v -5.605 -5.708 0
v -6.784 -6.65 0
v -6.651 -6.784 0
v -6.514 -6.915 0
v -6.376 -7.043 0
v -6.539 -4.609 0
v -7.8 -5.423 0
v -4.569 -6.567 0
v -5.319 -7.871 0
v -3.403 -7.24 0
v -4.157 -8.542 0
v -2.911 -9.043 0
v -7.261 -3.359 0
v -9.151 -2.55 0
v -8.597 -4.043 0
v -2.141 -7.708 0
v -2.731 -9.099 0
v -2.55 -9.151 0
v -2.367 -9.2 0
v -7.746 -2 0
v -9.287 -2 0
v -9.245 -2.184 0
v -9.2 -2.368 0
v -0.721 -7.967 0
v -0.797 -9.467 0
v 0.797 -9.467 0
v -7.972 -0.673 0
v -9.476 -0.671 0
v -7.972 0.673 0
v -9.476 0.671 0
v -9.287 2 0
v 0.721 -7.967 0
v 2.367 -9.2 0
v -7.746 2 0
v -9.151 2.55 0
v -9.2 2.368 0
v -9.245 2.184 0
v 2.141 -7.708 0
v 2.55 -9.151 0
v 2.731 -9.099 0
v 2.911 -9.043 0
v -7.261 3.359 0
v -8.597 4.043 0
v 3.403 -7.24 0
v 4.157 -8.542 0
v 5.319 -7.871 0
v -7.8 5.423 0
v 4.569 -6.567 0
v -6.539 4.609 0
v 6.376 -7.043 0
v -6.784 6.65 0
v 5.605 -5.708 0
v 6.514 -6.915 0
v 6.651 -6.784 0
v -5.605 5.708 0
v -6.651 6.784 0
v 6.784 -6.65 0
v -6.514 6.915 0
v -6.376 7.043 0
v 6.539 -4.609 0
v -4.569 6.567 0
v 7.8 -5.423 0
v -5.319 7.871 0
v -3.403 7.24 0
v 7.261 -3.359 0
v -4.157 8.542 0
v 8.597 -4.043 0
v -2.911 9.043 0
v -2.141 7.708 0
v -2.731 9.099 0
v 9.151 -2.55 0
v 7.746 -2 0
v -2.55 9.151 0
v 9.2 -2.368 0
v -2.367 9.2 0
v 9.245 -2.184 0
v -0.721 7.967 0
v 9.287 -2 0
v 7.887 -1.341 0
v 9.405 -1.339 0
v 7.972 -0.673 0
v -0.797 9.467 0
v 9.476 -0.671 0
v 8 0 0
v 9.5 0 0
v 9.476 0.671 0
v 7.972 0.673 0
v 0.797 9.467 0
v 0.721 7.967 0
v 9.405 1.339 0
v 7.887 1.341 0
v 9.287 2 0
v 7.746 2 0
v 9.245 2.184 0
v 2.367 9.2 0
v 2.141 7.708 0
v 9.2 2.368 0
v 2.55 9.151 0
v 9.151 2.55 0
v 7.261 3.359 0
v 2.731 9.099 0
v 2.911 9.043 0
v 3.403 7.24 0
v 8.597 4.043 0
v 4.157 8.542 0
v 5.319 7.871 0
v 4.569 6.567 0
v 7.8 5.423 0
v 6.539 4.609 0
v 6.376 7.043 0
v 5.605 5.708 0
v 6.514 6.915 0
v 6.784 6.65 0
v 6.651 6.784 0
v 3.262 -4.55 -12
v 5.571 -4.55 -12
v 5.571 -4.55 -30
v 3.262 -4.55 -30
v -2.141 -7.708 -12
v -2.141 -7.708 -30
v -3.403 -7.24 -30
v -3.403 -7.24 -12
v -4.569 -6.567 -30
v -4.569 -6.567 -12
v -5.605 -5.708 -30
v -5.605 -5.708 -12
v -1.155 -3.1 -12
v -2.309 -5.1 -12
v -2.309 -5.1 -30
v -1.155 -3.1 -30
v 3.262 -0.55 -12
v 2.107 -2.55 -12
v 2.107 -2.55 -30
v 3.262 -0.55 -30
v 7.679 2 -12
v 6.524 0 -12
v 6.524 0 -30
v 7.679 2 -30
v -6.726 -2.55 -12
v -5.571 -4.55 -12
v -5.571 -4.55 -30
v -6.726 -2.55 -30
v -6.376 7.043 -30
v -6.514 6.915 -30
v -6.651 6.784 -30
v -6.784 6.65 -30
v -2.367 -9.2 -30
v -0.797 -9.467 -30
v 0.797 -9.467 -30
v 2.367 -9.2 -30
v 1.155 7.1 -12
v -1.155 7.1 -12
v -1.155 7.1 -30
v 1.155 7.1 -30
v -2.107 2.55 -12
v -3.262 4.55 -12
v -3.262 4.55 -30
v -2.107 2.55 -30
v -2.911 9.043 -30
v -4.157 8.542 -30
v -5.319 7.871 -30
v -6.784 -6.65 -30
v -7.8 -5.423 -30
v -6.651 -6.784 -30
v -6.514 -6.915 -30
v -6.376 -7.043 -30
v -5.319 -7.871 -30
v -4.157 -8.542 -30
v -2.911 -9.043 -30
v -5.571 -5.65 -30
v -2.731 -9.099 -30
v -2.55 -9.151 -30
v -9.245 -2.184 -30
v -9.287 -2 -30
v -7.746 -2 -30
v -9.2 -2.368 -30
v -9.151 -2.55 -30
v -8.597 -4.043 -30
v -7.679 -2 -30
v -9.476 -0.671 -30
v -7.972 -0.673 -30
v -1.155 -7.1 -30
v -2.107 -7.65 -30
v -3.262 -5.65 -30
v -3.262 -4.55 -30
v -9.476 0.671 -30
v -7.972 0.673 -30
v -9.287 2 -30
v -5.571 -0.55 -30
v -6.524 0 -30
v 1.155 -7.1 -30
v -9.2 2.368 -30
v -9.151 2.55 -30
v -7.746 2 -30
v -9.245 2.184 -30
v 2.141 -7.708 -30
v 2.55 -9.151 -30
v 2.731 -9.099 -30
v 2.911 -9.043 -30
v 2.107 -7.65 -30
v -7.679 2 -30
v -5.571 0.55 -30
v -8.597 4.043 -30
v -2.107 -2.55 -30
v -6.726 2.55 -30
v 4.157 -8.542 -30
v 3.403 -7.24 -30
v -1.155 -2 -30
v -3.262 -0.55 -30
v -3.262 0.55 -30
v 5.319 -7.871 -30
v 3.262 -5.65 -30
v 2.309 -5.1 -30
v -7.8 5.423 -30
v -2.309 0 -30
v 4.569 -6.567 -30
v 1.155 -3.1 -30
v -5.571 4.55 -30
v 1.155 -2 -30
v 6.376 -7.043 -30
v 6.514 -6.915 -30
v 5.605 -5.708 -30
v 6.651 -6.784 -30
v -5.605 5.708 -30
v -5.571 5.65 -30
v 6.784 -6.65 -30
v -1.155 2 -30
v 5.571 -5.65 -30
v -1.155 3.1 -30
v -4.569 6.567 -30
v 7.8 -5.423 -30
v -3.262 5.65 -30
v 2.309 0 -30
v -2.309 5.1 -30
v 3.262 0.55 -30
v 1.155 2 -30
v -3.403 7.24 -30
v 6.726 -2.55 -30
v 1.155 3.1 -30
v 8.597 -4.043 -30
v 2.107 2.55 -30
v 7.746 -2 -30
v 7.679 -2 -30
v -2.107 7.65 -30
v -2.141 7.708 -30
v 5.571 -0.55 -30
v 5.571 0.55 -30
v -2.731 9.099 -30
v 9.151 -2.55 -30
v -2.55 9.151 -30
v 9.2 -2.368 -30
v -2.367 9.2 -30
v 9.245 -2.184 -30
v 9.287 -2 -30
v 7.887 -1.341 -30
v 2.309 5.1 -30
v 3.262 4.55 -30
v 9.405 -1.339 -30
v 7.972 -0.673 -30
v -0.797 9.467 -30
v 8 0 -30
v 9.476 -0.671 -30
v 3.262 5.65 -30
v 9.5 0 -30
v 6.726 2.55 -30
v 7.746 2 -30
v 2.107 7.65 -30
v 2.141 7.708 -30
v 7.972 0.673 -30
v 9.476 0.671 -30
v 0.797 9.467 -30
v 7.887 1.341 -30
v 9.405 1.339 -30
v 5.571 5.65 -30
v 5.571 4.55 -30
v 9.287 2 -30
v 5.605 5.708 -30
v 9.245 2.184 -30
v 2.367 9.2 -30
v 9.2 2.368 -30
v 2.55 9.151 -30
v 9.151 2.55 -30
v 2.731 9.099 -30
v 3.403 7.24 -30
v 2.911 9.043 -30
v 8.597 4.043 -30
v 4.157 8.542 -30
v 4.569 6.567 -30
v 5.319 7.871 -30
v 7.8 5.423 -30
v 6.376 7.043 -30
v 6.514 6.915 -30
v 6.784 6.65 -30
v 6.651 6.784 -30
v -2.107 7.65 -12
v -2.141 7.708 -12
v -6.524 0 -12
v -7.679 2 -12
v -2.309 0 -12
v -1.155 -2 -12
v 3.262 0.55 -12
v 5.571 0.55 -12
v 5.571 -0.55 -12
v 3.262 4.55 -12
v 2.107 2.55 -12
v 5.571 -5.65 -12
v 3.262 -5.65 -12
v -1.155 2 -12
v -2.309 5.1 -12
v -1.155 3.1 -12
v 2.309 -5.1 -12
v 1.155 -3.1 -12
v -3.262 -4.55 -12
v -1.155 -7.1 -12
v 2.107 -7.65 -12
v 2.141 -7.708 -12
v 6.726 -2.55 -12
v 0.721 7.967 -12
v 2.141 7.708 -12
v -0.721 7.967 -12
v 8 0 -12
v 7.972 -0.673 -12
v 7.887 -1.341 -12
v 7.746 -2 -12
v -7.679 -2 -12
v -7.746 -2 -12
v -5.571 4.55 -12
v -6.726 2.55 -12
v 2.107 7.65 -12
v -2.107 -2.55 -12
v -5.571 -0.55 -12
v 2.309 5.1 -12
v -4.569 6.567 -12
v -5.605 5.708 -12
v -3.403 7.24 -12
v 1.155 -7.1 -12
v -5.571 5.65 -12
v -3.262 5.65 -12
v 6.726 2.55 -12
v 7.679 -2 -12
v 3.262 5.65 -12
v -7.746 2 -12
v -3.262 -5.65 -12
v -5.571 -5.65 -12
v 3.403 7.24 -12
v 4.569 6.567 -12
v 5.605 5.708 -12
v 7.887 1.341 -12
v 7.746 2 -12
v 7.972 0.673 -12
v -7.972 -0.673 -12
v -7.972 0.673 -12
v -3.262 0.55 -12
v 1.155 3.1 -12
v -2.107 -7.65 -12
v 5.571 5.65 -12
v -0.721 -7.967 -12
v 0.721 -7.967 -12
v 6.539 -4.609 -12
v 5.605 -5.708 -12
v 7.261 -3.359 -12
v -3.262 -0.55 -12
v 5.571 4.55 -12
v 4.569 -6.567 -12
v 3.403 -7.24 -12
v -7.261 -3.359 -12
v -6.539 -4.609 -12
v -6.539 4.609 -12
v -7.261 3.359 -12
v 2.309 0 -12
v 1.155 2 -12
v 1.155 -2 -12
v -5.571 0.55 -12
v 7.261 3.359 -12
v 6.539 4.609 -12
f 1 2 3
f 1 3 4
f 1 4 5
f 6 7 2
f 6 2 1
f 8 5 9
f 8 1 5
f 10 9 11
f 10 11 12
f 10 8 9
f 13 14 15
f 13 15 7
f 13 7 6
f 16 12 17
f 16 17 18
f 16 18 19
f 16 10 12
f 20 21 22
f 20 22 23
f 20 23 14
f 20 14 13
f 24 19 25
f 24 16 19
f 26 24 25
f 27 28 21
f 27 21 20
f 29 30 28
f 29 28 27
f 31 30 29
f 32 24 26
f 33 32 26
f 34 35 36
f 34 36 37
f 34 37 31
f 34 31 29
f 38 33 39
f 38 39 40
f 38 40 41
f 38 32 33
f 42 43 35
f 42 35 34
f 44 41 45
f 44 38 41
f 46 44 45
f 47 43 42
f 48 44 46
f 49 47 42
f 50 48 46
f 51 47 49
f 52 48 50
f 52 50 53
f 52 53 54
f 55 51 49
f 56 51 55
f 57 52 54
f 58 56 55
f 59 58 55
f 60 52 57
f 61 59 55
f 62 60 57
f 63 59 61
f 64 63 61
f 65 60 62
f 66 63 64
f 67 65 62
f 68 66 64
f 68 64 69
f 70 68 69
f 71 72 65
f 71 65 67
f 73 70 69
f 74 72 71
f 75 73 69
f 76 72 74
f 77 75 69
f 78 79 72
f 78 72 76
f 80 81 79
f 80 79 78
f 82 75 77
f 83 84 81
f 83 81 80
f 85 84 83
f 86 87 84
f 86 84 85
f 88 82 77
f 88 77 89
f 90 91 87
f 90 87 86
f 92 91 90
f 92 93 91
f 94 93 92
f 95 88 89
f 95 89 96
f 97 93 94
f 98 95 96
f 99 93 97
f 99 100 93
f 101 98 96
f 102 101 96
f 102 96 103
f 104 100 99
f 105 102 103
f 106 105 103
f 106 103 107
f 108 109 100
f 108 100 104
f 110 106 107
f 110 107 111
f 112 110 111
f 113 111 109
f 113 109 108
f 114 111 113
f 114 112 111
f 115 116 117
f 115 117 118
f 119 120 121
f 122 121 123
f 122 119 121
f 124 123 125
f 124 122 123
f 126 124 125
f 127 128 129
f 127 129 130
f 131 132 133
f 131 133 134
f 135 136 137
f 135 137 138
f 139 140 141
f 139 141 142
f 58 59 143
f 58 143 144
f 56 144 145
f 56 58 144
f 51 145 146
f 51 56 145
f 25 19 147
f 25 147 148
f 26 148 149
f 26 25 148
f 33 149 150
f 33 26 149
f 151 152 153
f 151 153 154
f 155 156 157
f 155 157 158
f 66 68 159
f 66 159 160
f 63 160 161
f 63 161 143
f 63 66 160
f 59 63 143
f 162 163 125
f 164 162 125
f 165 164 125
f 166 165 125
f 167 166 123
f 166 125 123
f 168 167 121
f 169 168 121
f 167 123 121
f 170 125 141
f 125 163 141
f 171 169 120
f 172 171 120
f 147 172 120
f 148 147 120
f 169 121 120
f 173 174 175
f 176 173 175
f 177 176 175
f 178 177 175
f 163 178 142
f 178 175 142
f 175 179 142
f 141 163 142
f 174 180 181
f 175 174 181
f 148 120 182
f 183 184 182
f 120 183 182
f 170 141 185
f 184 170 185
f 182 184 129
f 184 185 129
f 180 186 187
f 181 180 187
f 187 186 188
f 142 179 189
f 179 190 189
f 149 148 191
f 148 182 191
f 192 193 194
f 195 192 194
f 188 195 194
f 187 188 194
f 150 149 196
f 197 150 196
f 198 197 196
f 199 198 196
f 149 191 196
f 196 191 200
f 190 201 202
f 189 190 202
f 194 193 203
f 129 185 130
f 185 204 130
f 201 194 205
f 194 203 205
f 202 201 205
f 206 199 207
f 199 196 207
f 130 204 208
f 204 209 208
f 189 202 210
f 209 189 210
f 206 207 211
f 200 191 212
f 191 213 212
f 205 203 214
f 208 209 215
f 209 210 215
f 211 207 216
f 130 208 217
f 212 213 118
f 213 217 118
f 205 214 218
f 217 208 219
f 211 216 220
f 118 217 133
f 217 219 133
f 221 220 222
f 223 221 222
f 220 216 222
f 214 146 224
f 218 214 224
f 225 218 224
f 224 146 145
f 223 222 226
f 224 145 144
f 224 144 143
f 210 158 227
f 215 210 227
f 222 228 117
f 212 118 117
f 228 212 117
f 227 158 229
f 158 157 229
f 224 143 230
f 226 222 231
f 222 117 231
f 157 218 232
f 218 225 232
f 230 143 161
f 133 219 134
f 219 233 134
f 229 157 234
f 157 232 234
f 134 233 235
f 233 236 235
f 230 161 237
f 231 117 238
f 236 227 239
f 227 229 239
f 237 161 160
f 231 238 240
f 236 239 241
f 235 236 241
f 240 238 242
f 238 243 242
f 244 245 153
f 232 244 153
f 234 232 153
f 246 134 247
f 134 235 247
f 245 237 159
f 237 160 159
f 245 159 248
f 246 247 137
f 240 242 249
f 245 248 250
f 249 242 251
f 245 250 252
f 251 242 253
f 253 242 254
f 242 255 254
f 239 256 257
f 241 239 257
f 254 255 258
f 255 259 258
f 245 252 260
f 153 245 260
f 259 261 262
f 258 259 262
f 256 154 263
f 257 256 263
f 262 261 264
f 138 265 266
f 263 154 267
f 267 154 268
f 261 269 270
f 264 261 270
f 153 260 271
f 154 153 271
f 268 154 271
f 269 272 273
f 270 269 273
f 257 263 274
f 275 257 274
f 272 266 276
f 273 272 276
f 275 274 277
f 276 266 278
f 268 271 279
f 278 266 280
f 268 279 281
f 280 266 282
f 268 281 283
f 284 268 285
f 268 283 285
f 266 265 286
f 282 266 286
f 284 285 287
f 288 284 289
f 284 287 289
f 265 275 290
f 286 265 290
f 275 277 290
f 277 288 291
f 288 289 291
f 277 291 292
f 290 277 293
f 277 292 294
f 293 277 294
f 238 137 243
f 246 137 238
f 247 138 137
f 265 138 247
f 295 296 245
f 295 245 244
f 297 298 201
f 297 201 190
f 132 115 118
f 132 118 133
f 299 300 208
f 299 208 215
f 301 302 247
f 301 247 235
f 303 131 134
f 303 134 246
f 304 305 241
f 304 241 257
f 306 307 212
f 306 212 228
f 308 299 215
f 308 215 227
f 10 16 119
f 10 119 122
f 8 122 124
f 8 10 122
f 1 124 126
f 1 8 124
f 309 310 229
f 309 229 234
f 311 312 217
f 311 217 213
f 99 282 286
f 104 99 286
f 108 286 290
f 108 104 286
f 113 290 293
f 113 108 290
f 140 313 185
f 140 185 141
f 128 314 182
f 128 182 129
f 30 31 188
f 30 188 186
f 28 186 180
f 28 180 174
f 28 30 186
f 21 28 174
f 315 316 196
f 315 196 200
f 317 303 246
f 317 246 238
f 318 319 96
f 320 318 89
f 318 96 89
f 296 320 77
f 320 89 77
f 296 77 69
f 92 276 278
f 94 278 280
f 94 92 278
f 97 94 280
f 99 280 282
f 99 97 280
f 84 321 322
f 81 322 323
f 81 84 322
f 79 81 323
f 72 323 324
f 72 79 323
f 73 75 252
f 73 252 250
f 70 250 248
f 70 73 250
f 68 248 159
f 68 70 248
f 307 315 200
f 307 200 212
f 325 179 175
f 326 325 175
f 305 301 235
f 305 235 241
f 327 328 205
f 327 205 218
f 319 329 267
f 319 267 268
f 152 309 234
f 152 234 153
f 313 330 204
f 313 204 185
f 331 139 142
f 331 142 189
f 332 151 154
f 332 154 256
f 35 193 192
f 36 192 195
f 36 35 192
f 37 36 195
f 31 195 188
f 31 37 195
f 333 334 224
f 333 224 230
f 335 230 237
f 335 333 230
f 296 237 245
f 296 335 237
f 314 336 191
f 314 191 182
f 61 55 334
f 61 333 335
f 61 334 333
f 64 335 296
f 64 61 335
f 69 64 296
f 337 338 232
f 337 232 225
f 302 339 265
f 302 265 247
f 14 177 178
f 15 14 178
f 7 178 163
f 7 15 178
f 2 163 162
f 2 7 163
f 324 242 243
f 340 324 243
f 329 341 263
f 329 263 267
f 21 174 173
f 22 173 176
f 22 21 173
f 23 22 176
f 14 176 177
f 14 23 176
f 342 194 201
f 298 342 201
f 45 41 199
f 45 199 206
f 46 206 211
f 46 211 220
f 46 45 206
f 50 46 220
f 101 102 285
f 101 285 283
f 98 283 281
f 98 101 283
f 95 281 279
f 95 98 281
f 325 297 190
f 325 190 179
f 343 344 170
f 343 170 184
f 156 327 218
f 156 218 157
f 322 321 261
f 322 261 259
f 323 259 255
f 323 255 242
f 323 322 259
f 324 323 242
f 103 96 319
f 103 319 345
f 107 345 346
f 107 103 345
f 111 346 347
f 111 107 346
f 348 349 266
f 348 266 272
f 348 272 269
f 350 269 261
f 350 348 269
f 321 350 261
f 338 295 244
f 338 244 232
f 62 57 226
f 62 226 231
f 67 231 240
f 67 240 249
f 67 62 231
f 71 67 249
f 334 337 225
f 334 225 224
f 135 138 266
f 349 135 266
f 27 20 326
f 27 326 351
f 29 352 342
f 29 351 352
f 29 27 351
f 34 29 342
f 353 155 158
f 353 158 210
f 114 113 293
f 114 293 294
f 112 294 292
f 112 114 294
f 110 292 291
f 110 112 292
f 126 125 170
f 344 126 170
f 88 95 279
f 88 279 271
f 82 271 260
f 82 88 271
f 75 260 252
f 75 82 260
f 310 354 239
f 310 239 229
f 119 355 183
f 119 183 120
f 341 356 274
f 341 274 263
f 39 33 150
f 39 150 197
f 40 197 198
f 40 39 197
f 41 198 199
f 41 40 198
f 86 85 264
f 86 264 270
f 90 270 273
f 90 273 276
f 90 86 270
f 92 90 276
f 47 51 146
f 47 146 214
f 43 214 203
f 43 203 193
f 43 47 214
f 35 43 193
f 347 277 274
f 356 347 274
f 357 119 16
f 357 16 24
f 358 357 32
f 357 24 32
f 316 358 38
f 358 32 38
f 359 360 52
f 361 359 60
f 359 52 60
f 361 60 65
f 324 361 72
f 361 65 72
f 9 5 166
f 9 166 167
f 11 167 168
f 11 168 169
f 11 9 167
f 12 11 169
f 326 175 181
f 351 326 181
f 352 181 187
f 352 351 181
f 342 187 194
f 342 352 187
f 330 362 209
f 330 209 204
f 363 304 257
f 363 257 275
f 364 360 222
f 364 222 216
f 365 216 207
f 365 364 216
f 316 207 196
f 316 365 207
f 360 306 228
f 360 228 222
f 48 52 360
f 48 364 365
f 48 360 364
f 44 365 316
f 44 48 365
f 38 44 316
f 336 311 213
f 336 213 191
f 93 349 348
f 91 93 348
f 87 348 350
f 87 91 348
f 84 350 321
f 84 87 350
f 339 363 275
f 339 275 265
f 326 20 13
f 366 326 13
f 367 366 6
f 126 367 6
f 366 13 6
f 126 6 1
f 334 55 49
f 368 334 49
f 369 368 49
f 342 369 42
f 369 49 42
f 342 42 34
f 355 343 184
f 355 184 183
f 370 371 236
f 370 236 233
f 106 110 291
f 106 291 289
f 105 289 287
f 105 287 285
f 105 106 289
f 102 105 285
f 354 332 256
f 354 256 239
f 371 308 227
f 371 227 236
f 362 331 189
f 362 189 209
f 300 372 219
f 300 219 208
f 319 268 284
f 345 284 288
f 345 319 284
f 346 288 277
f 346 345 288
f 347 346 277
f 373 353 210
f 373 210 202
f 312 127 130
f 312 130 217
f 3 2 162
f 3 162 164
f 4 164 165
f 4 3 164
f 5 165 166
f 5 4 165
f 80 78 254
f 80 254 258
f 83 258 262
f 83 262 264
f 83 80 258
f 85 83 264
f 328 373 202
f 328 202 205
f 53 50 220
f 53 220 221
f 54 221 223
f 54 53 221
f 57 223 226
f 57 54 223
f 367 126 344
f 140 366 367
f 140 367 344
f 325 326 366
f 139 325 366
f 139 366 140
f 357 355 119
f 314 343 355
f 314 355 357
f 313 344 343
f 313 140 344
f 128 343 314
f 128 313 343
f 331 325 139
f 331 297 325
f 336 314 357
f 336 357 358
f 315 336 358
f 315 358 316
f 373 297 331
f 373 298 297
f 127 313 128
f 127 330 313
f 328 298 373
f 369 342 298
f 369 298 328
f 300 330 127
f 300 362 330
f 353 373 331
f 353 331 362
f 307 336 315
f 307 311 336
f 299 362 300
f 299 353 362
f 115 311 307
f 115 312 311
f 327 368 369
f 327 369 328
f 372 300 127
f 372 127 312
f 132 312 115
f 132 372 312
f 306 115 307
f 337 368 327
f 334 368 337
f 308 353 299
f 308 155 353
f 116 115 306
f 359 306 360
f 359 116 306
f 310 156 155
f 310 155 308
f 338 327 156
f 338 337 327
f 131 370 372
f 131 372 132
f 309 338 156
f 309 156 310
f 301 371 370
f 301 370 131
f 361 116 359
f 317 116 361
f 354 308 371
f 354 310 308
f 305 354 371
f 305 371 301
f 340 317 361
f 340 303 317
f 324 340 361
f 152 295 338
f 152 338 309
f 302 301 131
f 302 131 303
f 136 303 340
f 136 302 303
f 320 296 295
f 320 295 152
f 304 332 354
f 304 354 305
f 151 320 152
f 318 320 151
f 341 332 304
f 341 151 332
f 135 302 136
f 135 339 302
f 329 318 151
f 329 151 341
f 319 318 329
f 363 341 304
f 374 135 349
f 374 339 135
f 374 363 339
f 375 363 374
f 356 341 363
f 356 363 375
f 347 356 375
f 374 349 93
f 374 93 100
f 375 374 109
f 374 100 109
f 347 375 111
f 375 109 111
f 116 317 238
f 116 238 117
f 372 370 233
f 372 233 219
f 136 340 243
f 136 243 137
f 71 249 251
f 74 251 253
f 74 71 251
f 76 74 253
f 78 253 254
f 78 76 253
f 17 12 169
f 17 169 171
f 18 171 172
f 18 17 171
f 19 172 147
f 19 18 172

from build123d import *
from build123d import SkipClean  # not in build123d's __all__

# Parameters (mm, degrees)
F1_DEPTH = 30
F2_R     = 8
F3_DEPTH = 12


with BuildPart() as f1:
    # F0 (on Top) → F1 (new body)
    with BuildSketch(Plane.XY):
        with BuildLine():
            Line((-5.9997200782, 5.2918200067), (-6.7840477888, 6.6503154511))
            ThreePointArc((-6.7840477888, 6.6503154511), (-8.227241336, 4.75), (-9.1513660183, 2.55))
            Line((-9.1513660183, 2.55), (-7.5827105971, 2.55))
            ThreePointArc((-7.5827105971, 2.55), (-6.9282032303, 4), (-5.9997200782, 5.2918200067))
        make_face()
        with BuildLine():
            Line((-7.5827105971, 2.55), (-9.1513660183, 2.55))
            ThreePointArc((-9.1513660183, 2.55), (-9.2233274852, 2.2760118851), (-9.2870878105, 2))
            Line((-9.2870878105, 2), (-7.7459666924, 2))
            ThreePointArc((-7.7459666924, 2), (-7.6692706212, 2.2764639549), (-7.5827105971, 2.55))
        make_face()
        with BuildLine():
            Line((-7.7459666924, 2), (-9.2870878105, 2))
            ThreePointArc((-9.2870878105, 2), (-9.5, 0), (-9.2870878105, -2))
            Line((-9.2870878105, -2), (-7.7459666924, -2))
            ThreePointArc((-7.7459666924, -2), (-8, 0), (-7.7459666924, 2))
        make_face()
        with BuildLine():
            ThreePointArc((-9.2870878105, -2), (-9.2233274852, -2.2760118851), (-9.1513660183, -2.55))
            Line((-9.1513660183, -2.55), (-7.5827105971, -2.55))
            ThreePointArc((-7.5827105971, -2.55), (-7.6692706212, -2.2764639549), (-7.7459666924, -2))
            Line((-7.7459666924, -2), (-9.2870878105, -2))
        make_face()
        with BuildLine():
            ThreePointArc((-9.1513660183, -2.55), (-8.227241336, -4.75), (-6.7840477888, -6.6503154511))
            Line((-6.7840477888, -6.6503154511), (-5.9997200782, -5.2918200067))
            ThreePointArc((-5.9997200782, -5.2918200067), (-6.9282032303, -4), (-7.5827105971, -2.55))
            Line((-7.5827105971, -2.55), (-9.1513660183, -2.55))
        make_face()
        with BuildLine():
            ThreePointArc((-6.7840477888, -6.6503154511), (-6.5827478544, -6.849629967), (-6.3755947128, -7.0428539711))
            Line((-6.3755947128, -7.0428539711), (-5.6050341538, -5.7082039325))
            ThreePointArc((-5.6050341538, -5.7082039325), (-5.8061109264, -5.503551209), (-5.9997200782, -5.2918200067))
            Line((-5.9997200782, -5.2918200067), (-6.7840477888, -6.6503154511))
        make_face()
        with BuildLine():
            ThreePointArc((-6.3755947128, -7.0428539711), (-4.75, -8.227241336), (-2.9114930977, -9.0428539711))
            Line((-2.9114930977, -9.0428539711), (-2.1409325386, -7.7082039325))
            ThreePointArc((-2.1409325386, -7.7082039325), (-4, -6.9282032303), (-5.6050341538, -5.7082039325))
            Line((-5.6050341538, -5.7082039325), (-6.3755947128, -7.0428539711))
        make_face()
        with BuildLine():
            ThreePointArc((-2.9114930977, -9.0428539711), (-2.6405796308, -9.1256418521), (-2.3673182295, -9.2003154511))
            Line((-2.3673182295, -9.2003154511), (-1.5829905189, -7.8418200067))
            ThreePointArc((-1.5829905189, -7.8418200067), (-1.8631596948, -7.780015164), (-2.1409325386, -7.7082039325))
            Line((-2.1409325386, -7.7082039325), (-2.9114930977, -9.0428539711))
        make_face()
        with BuildLine():
            ThreePointArc((-2.3673182295, -9.2003154511), (0, -9.5), (2.3673182295, -9.2003154511))
            Line((2.3673182295, -9.2003154511), (1.5829905189, -7.8418200067))
            ThreePointArc((1.5829905189, -7.8418200067), (0, -8), (-1.5829905189, -7.8418200067))
            Line((-1.5829905189, -7.8418200067), (-2.3673182295, -9.2003154511))
        make_face()
        with BuildLine():
            ThreePointArc((2.3673182295, -9.2003154511), (2.6405796308, -9.1256418521), (2.9114930977, -9.0428539711))
            Line((2.9114930977, -9.0428539711), (2.1409325386, -7.7082039325))
            ThreePointArc((2.1409325386, -7.7082039325), (1.8631596948, -7.780015164), (1.5829905189, -7.8418200067))
            Line((1.5829905189, -7.8418200067), (2.3673182295, -9.2003154511))
        make_face()
        with BuildLine():
            ThreePointArc((2.9114930977, -9.0428539711), (4.75, -8.227241336), (6.3755947128, -7.0428539711))
            Line((6.3755947128, -7.0428539711), (5.6050341538, -5.7082039325))
            ThreePointArc((5.6050341538, -5.7082039325), (4, -6.9282032303), (2.1409325386, -7.7082039325))
            Line((2.1409325386, -7.7082039325), (2.9114930977, -9.0428539711))
        make_face()
        with BuildLine():
            ThreePointArc((6.3755947128, -7.0428539711), (6.5827478544, -6.849629967), (6.7840477888, -6.6503154511))
            Line((6.7840477888, -6.6503154511), (5.9997200782, -5.2918200067))
            ThreePointArc((5.9997200782, -5.2918200067), (5.8061109264, -5.503551209), (5.6050341538, -5.7082039325))
            Line((5.6050341538, -5.7082039325), (6.3755947128, -7.0428539711))
        make_face()
        with BuildLine():
            ThreePointArc((6.7840477888, -6.6503154511), (8.227241336, -4.75), (9.1513660183, -2.55))
            Line((9.1513660183, -2.55), (7.5827105971, -2.55))
            ThreePointArc((7.5827105971, -2.55), (6.9282032303, -4), (5.9997200782, -5.2918200067))
            Line((5.9997200782, -5.2918200067), (6.7840477888, -6.6503154511))
        make_face()
        with BuildLine():
            ThreePointArc((9.1513660183, -2.55), (9.2233274852, -2.2760118851), (9.2870878105, -2))
            Line((9.2870878105, -2), (7.7459666924, -2))
            ThreePointArc((7.7459666924, -2), (7.6692706212, -2.2764639549), (7.5827105971, -2.55))
            Line((7.5827105971, -2.55), (9.1513660183, -2.55))
        make_face()
        with BuildLine():
            ThreePointArc((9.2870878105, -2), (9.4466219941, -1.0056504861), (9.5, 0))
            ThreePointArc((9.5, 0), (9.4466219941, 1.0056504861), (9.2870878105, 2))
            Line((9.2870878105, 2), (7.7459666924, 2))
            ThreePointArc((7.7459666924, 2), (7.9362375701, 1.0080343399), (8, 0))
            ThreePointArc((8, 0), (7.9362375701, -1.0080343399), (7.7459666924, -2))
            Line((7.7459666924, -2), (9.2870878105, -2))
        make_face()
        with BuildLine():
            Line((7.7459666924, 2), (9.2870878105, 2))
            ThreePointArc((9.2870878105, 2), (9.2233274852, 2.2760118851), (9.1513660183, 2.55))
            Line((9.1513660183, 2.55), (7.5827105971, 2.55))
            ThreePointArc((7.5827105971, 2.55), (7.6692706212, 2.2764639549), (7.7459666924, 2))
        make_face()
        with BuildLine():
            Line((7.5827105971, 2.55), (9.1513660183, 2.55))
            ThreePointArc((9.1513660183, 2.55), (8.227241336, 4.75), (6.7840477888, 6.6503154511))
            Line((6.7840477888, 6.6503154511), (5.9997200782, 5.2918200067))
            ThreePointArc((5.9997200782, 5.2918200067), (6.9282032303, 4), (7.5827105971, 2.55))
        make_face()
        with BuildLine():
            Line((5.9997200782, 5.2918200067), (6.7840477888, 6.6503154511))
            ThreePointArc((6.7840477888, 6.6503154511), (6.5827478544, 6.849629967), (6.3755947128, 7.0428539711))
            Line((6.3755947128, 7.0428539711), (5.6050341538, 5.7082039325))
            ThreePointArc((5.6050341538, 5.7082039325), (5.8061109264, 5.503551209), (5.9997200782, 5.2918200067))
        make_face()
        with BuildLine():
            Line((5.6050341538, 5.7082039325), (6.3755947128, 7.0428539711))
            ThreePointArc((6.3755947128, 7.0428539711), (4.75, 8.227241336), (2.9114930977, 9.0428539711))
            Line((2.9114930977, 9.0428539711), (2.1409325386, 7.7082039325))
            ThreePointArc((2.1409325386, 7.7082039325), (4, 6.9282032303), (5.6050341538, 5.7082039325))
        make_face()
        with BuildLine():
            Line((2.1409325386, 7.7082039325), (2.9114930977, 9.0428539711))
            ThreePointArc((2.9114930977, 9.0428539711), (2.6405796308, 9.1256418521), (2.3673182295, 9.2003154511))
            Line((2.3673182295, 9.2003154511), (1.5829905189, 7.8418200067))
            ThreePointArc((1.5829905189, 7.8418200067), (1.8631596948, 7.780015164), (2.1409325386, 7.7082039325))
        make_face()
        with BuildLine():
            Line((1.5829905189, 7.8418200067), (2.3673182295, 9.2003154511))
            ThreePointArc((2.3673182295, 9.2003154511), (0, 9.5), (-2.3673182295, 9.2003154511))
            Line((-2.3673182295, 9.2003154511), (-1.5829905189, 7.8418200067))
            ThreePointArc((-1.5829905189, 7.8418200067), (0, 8), (1.5829905189, 7.8418200067))
        make_face()
        with BuildLine():
            Line((-1.5829905189, 7.8418200067), (-2.3673182295, 9.2003154511))
            ThreePointArc((-2.3673182295, 9.2003154511), (-2.6405796308, 9.1256418521), (-2.9114930977, 9.0428539711))
            Line((-2.9114930977, 9.0428539711), (-2.1409325386, 7.7082039325))
            ThreePointArc((-2.1409325386, 7.7082039325), (-1.8631596948, 7.780015164), (-1.5829905189, 7.8418200067))
        make_face()
        with BuildLine():
            Line((-2.1409325386, 7.7082039325), (-2.9114930977, 9.0428539711))
            ThreePointArc((-2.9114930977, 9.0428539711), (-4.75, 8.227241336), (-6.3755947128, 7.0428539711))
            Line((-6.3755947128, 7.0428539711), (-5.6050341538, 5.7082039325))
            ThreePointArc((-5.6050341538, 5.7082039325), (-4, 6.9282032303), (-2.1409325386, 7.7082039325))
        make_face()
        with BuildLine():
            Line((-5.6050341538, 5.7082039325), (-6.3755947128, 7.0428539711))
            ThreePointArc((-6.3755947128, 7.0428539711), (-6.5827478544, 6.849629967), (-6.7840477888, 6.6503154511))
            Line((-6.7840477888, 6.6503154511), (-5.9997200782, 5.2918200067))
            ThreePointArc((-5.9997200782, 5.2918200067), (-5.8061109264, 5.503551209), (-5.6050341538, 5.7082039325))
        make_face()
        with BuildLine():
            Line((1.4722431864, 7.65), (1.5829905189, 7.8418200067))
            ThreePointArc((1.5829905189, 7.8418200067), (0, 8), (-1.5829905189, 7.8418200067))
            Line((-1.5829905189, 7.8418200067), (-1.4722431864, 7.65))
            Line((-1.4722431864, 7.65), (1.4722431864, 7.65))
        make_face()
        with BuildLine():
            Line((-7.3612159322, 2.55), (-5.8889727457, 5.1))
            Line((-5.8889727457, 5.1), (-5.9997200782, 5.2918200067))
            ThreePointArc((-5.9997200782, 5.2918200067), (-6.9282032303, 4), (-7.5827105971, 2.55))
            Line((-7.5827105971, 2.55), (-7.3612159322, 2.55))
        make_face()
        with BuildLine():
            Line((-5.9997200782, -5.2918200067), (-5.8889727457, -5.1))
            Line((-5.8889727457, -5.1), (-7.3612159322, -2.55))
            Line((-7.3612159322, -2.55), (-7.5827105971, -2.55))
            ThreePointArc((-7.5827105971, -2.55), (-6.9282032303, -4), (-5.9997200782, -5.2918200067))
        make_face()
        with BuildLine():
            ThreePointArc((-1.5829905189, -7.8418200067), (0, -8), (1.5829905189, -7.8418200067))
            Line((1.5829905189, -7.8418200067), (1.4722431864, -7.65))
            Line((1.4722431864, -7.65), (-1.4722431864, -7.65))
            Line((-1.4722431864, -7.65), (-1.5829905189, -7.8418200067))
        make_face()
        with BuildLine():
            ThreePointArc((5.9997200782, -5.2918200067), (6.9282032303, -4), (7.5827105971, -2.55))
            Line((7.5827105971, -2.55), (7.3612159322, -2.55))
            Line((7.3612159322, -2.55), (5.8889727457, -5.1))
            Line((5.8889727457, -5.1), (5.9997200782, -5.2918200067))
        make_face()
        with BuildLine():
            Line((7.3612159322, 2.55), (7.5827105971, 2.55))
            ThreePointArc((7.5827105971, 2.55), (6.9282032303, 4), (5.9997200782, 5.2918200067))
            Line((5.9997200782, 5.2918200067), (5.8889727457, 5.1))
            Line((5.8889727457, 5.1), (7.3612159322, 2.55))
        make_face()
        with BuildLine():
            Line((5.8889727457, 5.1), (5.9997200782, 5.2918200067))
            ThreePointArc((5.9997200782, 5.2918200067), (5.8061109264, 5.503551209), (5.6050341538, 5.7082039325))
            Line((5.6050341538, 5.7082039325), (5.5714300977, 5.65))
            Line((5.5714300977, 5.65), (3.2620290209, 5.65))
            Line((3.2620290209, 5.65), (2.1073284825, 7.65))
            Line((2.1073284825, 7.65), (2.1409325386, 7.7082039325))
            ThreePointArc((2.1409325386, 7.7082039325), (1.8631596948, 7.780015164), (1.5829905189, 7.8418200067))
            Line((1.5829905189, 7.8418200067), (1.4722431864, 7.65))
            Line((1.4722431864, 7.65), (2.9444863729, 5.1))
            Line((2.9444863729, 5.1), (5.8889727457, 5.1))
        make_face()
        with BuildLine():
            Line((-1.4722431864, 7.65), (-1.5829905189, 7.8418200067))
            ThreePointArc((-1.5829905189, 7.8418200067), (-1.8631596948, 7.780015164), (-2.1409325386, 7.7082039325))
            Line((-2.1409325386, 7.7082039325), (-2.1073284825, 7.65))
            Line((-2.1073284825, 7.65), (-3.2620290209, 5.65))
            Line((-3.2620290209, 5.65), (-5.5714300977, 5.65))
            Line((-5.5714300977, 5.65), (-5.6050341538, 5.7082039325))
            ThreePointArc((-5.6050341538, 5.7082039325), (-5.8061109264, 5.503551209), (-5.9997200782, 5.2918200067))
            Line((-5.9997200782, 5.2918200067), (-5.8889727457, 5.1))
            Line((-5.8889727457, 5.1), (-2.9444863729, 5.1))
            Line((-2.9444863729, 5.1), (-1.4722431864, 7.65))
        make_face()
        with BuildLine():
            Line((-7.3612159322, -2.55), (-5.8889727457, 0))
            Line((-5.8889727457, 0), (-7.3612159322, 2.55))
            Line((-7.3612159322, 2.55), (-7.5827105971, 2.55))
            ThreePointArc((-7.5827105971, 2.55), (-7.6692706212, 2.2764639549), (-7.7459666924, 2))
            Line((-7.7459666924, 2), (-7.6787585802, 2))
            Line((-7.6787585802, 2), (-6.5240580418, 0))
            Line((-6.5240580418, 0), (-7.6787585802, -2))
            Line((-7.6787585802, -2), (-7.7459666924, -2))
            ThreePointArc((-7.7459666924, -2), (-7.6692706212, -2.2764639549), (-7.5827105971, -2.55))
            Line((-7.5827105971, -2.55), (-7.3612159322, -2.55))
        make_face()
        with BuildLine():
            Line((7.6787585802, 2), (7.7459666924, 2))
            ThreePointArc((7.7459666924, 2), (7.6692706212, 2.2764639549), (7.5827105971, 2.55))
            Line((7.5827105971, 2.55), (7.3612159322, 2.55))
            Line((7.3612159322, 2.55), (5.8889727457, 0))
            Line((5.8889727457, 0), (7.3612159322, -2.55))
            Line((7.3612159322, -2.55), (7.5827105971, -2.55))
            ThreePointArc((7.5827105971, -2.55), (7.6692706212, -2.2764639549), (7.7459666924, -2))
            Line((7.7459666924, -2), (7.6787585802, -2))
            Line((7.6787585802, -2), (6.5240580418, 0))
            Line((6.5240580418, 0), (7.6787585802, 2))
        make_face()
        with BuildLine():
            ThreePointArc((5.6050341538, -5.7082039325), (5.8061109264, -5.503551209), (5.9997200782, -5.2918200067))
            Line((5.9997200782, -5.2918200067), (5.8889727457, -5.1))
            Line((5.8889727457, -5.1), (2.9444863729, -5.1))
            Line((2.9444863729, -5.1), (1.4722431864, -7.65))
            Line((1.4722431864, -7.65), (1.5829905189, -7.8418200067))
            ThreePointArc((1.5829905189, -7.8418200067), (1.8631596948, -7.780015164), (2.1409325386, -7.7082039325))
            Line((2.1409325386, -7.7082039325), (2.1073284825, -7.65))
            Line((2.1073284825, -7.65), (3.2620290209, -5.65))
            Line((3.2620290209, -5.65), (5.5714300977, -5.65))
            Line((5.5714300977, -5.65), (5.6050341538, -5.7082039325))
        make_face()
        with BuildLine():
            ThreePointArc((-2.1409325386, -7.7082039325), (-1.8631596948, -7.780015164), (-1.5829905189, -7.8418200067))
            Line((-1.5829905189, -7.8418200067), (-1.4722431864, -7.65))
            Line((-1.4722431864, -7.65), (-2.9444863729, -5.1))
            Line((-2.9444863729, -5.1), (-5.8889727457, -5.1))
            Line((-5.8889727457, -5.1), (-5.9997200782, -5.2918200067))
            ThreePointArc((-5.9997200782, -5.2918200067), (-5.8061109264, -5.503551209), (-5.6050341538, -5.7082039325))
            Line((-5.6050341538, -5.7082039325), (-5.5714300977, -5.65))
            Line((-5.5714300977, -5.65), (-3.2620290209, -5.65))
            Line((-3.2620290209, -5.65), (-2.1073284825, -7.65))
            Line((-2.1073284825, -7.65), (-2.1409325386, -7.7082039325))
        make_face()
        Polygon((-2.9444863729, -5.1), (-1.4722431864, -2.55), (-2.9444863729, 0), (-5.8889727457, 0), (-7.3612159322, -2.55), (-5.8889727457, -5.1), align=None)
        Polygon((-5.5714300977, -0.55), (-3.2620290209, -0.55), (-2.1073284825, -2.55), (-3.2620290209, -4.55), (-5.5714300977, -4.55), (-6.7261306361, -2.55), align=None, mode=Mode.SUBTRACT)
        Polygon((1.4722431864, -7.65), (2.9444863729, -5.1), (1.4722431864, -2.55), (-1.4722431864, -2.55), (-2.9444863729, -5.1), (-1.4722431864, -7.65), align=None)
        Polygon((1.1547005384, -7.1), (-1.1547005384, -7.1), (-2.3094010768, -5.1), (-1.1547005384, -3.1), (1.1547005384, -3.1), (2.3094010768, -5.1), align=None, mode=Mode.SUBTRACT)
        Polygon((5.8889727457, -5.1), (7.3612159322, -2.55), (5.8889727457, 0), (2.9444863729, 0), (1.4722431864, -2.55), (2.9444863729, -5.1), align=None)
        Polygon((5.5714300977, -4.55), (3.2620290209, -4.55), (2.1073284825, -2.55), (3.2620290209, -0.55), (5.5714300977, -0.55), (6.7261306361, -2.55), align=None, mode=Mode.SUBTRACT)
        Polygon((5.8889727457, 0), (7.3612159322, 2.55), (5.8889727457, 5.1), (2.9444863729, 5.1), (1.4722431864, 2.55), (2.9444863729, 0), align=None)
        Polygon((5.5714300977, 4.55), (6.7261306361, 2.55), (5.5714300977, 0.55), (3.2620290209, 0.55), (2.1073284825, 2.55), (3.2620290209, 4.55), align=None, mode=Mode.SUBTRACT)
        Polygon((1.4722431864, 2.55), (2.9444863729, 5.1), (1.4722431864, 7.65), (-1.4722431864, 7.65), (-2.9444863729, 5.1), (-1.4722431864, 2.55), align=None)
        Polygon((1.1547005384, 7.1), (2.3094010768, 5.1), (1.1547005384, 3.1), (-1.1547005384, 3.1), (-2.3094010768, 5.1), (-1.1547005384, 7.1), align=None, mode=Mode.SUBTRACT)
        Polygon((-2.9444863729, 0), (-1.4722431864, 2.55), (-2.9444863729, 5.1), (-5.8889727457, 5.1), (-7.3612159322, 2.55), (-5.8889727457, 0), align=None)
        Polygon((-3.2620290209, 4.55), (-2.1073284825, 2.55), (-3.2620290209, 0.55), (-5.5714300977, 0.55), (-6.7261306361, 2.55), (-5.5714300977, 4.55), align=None, mode=Mode.SUBTRACT)
        Polygon((1.4722431864, -2.55), (2.9444863729, 0), (1.4722431864, 2.55), (-1.4722431864, 2.55), (-2.9444863729, 0), (-1.4722431864, -2.55), align=None)
        Polygon((1.1547005384, 2), (2.3094010768, 0), (1.1547005384, -2), (-1.1547005384, -2), (-2.3094010768, 0), (-1.1547005384, 2), align=None, mode=Mode.SUBTRACT)
    extrude(amount=-F1_DEPTH)

    # F2 (on Top) → F3 (cut)
    with BuildSketch(Plane.XY):
        Circle(F2_R)
    with SkipClean():  # cleaning this boolean's faces spoils the solid; the shape is the same uncleaned
        extrude(amount=-F3_DEPTH, mode=Mode.SUBTRACT)


solid = f1.part
